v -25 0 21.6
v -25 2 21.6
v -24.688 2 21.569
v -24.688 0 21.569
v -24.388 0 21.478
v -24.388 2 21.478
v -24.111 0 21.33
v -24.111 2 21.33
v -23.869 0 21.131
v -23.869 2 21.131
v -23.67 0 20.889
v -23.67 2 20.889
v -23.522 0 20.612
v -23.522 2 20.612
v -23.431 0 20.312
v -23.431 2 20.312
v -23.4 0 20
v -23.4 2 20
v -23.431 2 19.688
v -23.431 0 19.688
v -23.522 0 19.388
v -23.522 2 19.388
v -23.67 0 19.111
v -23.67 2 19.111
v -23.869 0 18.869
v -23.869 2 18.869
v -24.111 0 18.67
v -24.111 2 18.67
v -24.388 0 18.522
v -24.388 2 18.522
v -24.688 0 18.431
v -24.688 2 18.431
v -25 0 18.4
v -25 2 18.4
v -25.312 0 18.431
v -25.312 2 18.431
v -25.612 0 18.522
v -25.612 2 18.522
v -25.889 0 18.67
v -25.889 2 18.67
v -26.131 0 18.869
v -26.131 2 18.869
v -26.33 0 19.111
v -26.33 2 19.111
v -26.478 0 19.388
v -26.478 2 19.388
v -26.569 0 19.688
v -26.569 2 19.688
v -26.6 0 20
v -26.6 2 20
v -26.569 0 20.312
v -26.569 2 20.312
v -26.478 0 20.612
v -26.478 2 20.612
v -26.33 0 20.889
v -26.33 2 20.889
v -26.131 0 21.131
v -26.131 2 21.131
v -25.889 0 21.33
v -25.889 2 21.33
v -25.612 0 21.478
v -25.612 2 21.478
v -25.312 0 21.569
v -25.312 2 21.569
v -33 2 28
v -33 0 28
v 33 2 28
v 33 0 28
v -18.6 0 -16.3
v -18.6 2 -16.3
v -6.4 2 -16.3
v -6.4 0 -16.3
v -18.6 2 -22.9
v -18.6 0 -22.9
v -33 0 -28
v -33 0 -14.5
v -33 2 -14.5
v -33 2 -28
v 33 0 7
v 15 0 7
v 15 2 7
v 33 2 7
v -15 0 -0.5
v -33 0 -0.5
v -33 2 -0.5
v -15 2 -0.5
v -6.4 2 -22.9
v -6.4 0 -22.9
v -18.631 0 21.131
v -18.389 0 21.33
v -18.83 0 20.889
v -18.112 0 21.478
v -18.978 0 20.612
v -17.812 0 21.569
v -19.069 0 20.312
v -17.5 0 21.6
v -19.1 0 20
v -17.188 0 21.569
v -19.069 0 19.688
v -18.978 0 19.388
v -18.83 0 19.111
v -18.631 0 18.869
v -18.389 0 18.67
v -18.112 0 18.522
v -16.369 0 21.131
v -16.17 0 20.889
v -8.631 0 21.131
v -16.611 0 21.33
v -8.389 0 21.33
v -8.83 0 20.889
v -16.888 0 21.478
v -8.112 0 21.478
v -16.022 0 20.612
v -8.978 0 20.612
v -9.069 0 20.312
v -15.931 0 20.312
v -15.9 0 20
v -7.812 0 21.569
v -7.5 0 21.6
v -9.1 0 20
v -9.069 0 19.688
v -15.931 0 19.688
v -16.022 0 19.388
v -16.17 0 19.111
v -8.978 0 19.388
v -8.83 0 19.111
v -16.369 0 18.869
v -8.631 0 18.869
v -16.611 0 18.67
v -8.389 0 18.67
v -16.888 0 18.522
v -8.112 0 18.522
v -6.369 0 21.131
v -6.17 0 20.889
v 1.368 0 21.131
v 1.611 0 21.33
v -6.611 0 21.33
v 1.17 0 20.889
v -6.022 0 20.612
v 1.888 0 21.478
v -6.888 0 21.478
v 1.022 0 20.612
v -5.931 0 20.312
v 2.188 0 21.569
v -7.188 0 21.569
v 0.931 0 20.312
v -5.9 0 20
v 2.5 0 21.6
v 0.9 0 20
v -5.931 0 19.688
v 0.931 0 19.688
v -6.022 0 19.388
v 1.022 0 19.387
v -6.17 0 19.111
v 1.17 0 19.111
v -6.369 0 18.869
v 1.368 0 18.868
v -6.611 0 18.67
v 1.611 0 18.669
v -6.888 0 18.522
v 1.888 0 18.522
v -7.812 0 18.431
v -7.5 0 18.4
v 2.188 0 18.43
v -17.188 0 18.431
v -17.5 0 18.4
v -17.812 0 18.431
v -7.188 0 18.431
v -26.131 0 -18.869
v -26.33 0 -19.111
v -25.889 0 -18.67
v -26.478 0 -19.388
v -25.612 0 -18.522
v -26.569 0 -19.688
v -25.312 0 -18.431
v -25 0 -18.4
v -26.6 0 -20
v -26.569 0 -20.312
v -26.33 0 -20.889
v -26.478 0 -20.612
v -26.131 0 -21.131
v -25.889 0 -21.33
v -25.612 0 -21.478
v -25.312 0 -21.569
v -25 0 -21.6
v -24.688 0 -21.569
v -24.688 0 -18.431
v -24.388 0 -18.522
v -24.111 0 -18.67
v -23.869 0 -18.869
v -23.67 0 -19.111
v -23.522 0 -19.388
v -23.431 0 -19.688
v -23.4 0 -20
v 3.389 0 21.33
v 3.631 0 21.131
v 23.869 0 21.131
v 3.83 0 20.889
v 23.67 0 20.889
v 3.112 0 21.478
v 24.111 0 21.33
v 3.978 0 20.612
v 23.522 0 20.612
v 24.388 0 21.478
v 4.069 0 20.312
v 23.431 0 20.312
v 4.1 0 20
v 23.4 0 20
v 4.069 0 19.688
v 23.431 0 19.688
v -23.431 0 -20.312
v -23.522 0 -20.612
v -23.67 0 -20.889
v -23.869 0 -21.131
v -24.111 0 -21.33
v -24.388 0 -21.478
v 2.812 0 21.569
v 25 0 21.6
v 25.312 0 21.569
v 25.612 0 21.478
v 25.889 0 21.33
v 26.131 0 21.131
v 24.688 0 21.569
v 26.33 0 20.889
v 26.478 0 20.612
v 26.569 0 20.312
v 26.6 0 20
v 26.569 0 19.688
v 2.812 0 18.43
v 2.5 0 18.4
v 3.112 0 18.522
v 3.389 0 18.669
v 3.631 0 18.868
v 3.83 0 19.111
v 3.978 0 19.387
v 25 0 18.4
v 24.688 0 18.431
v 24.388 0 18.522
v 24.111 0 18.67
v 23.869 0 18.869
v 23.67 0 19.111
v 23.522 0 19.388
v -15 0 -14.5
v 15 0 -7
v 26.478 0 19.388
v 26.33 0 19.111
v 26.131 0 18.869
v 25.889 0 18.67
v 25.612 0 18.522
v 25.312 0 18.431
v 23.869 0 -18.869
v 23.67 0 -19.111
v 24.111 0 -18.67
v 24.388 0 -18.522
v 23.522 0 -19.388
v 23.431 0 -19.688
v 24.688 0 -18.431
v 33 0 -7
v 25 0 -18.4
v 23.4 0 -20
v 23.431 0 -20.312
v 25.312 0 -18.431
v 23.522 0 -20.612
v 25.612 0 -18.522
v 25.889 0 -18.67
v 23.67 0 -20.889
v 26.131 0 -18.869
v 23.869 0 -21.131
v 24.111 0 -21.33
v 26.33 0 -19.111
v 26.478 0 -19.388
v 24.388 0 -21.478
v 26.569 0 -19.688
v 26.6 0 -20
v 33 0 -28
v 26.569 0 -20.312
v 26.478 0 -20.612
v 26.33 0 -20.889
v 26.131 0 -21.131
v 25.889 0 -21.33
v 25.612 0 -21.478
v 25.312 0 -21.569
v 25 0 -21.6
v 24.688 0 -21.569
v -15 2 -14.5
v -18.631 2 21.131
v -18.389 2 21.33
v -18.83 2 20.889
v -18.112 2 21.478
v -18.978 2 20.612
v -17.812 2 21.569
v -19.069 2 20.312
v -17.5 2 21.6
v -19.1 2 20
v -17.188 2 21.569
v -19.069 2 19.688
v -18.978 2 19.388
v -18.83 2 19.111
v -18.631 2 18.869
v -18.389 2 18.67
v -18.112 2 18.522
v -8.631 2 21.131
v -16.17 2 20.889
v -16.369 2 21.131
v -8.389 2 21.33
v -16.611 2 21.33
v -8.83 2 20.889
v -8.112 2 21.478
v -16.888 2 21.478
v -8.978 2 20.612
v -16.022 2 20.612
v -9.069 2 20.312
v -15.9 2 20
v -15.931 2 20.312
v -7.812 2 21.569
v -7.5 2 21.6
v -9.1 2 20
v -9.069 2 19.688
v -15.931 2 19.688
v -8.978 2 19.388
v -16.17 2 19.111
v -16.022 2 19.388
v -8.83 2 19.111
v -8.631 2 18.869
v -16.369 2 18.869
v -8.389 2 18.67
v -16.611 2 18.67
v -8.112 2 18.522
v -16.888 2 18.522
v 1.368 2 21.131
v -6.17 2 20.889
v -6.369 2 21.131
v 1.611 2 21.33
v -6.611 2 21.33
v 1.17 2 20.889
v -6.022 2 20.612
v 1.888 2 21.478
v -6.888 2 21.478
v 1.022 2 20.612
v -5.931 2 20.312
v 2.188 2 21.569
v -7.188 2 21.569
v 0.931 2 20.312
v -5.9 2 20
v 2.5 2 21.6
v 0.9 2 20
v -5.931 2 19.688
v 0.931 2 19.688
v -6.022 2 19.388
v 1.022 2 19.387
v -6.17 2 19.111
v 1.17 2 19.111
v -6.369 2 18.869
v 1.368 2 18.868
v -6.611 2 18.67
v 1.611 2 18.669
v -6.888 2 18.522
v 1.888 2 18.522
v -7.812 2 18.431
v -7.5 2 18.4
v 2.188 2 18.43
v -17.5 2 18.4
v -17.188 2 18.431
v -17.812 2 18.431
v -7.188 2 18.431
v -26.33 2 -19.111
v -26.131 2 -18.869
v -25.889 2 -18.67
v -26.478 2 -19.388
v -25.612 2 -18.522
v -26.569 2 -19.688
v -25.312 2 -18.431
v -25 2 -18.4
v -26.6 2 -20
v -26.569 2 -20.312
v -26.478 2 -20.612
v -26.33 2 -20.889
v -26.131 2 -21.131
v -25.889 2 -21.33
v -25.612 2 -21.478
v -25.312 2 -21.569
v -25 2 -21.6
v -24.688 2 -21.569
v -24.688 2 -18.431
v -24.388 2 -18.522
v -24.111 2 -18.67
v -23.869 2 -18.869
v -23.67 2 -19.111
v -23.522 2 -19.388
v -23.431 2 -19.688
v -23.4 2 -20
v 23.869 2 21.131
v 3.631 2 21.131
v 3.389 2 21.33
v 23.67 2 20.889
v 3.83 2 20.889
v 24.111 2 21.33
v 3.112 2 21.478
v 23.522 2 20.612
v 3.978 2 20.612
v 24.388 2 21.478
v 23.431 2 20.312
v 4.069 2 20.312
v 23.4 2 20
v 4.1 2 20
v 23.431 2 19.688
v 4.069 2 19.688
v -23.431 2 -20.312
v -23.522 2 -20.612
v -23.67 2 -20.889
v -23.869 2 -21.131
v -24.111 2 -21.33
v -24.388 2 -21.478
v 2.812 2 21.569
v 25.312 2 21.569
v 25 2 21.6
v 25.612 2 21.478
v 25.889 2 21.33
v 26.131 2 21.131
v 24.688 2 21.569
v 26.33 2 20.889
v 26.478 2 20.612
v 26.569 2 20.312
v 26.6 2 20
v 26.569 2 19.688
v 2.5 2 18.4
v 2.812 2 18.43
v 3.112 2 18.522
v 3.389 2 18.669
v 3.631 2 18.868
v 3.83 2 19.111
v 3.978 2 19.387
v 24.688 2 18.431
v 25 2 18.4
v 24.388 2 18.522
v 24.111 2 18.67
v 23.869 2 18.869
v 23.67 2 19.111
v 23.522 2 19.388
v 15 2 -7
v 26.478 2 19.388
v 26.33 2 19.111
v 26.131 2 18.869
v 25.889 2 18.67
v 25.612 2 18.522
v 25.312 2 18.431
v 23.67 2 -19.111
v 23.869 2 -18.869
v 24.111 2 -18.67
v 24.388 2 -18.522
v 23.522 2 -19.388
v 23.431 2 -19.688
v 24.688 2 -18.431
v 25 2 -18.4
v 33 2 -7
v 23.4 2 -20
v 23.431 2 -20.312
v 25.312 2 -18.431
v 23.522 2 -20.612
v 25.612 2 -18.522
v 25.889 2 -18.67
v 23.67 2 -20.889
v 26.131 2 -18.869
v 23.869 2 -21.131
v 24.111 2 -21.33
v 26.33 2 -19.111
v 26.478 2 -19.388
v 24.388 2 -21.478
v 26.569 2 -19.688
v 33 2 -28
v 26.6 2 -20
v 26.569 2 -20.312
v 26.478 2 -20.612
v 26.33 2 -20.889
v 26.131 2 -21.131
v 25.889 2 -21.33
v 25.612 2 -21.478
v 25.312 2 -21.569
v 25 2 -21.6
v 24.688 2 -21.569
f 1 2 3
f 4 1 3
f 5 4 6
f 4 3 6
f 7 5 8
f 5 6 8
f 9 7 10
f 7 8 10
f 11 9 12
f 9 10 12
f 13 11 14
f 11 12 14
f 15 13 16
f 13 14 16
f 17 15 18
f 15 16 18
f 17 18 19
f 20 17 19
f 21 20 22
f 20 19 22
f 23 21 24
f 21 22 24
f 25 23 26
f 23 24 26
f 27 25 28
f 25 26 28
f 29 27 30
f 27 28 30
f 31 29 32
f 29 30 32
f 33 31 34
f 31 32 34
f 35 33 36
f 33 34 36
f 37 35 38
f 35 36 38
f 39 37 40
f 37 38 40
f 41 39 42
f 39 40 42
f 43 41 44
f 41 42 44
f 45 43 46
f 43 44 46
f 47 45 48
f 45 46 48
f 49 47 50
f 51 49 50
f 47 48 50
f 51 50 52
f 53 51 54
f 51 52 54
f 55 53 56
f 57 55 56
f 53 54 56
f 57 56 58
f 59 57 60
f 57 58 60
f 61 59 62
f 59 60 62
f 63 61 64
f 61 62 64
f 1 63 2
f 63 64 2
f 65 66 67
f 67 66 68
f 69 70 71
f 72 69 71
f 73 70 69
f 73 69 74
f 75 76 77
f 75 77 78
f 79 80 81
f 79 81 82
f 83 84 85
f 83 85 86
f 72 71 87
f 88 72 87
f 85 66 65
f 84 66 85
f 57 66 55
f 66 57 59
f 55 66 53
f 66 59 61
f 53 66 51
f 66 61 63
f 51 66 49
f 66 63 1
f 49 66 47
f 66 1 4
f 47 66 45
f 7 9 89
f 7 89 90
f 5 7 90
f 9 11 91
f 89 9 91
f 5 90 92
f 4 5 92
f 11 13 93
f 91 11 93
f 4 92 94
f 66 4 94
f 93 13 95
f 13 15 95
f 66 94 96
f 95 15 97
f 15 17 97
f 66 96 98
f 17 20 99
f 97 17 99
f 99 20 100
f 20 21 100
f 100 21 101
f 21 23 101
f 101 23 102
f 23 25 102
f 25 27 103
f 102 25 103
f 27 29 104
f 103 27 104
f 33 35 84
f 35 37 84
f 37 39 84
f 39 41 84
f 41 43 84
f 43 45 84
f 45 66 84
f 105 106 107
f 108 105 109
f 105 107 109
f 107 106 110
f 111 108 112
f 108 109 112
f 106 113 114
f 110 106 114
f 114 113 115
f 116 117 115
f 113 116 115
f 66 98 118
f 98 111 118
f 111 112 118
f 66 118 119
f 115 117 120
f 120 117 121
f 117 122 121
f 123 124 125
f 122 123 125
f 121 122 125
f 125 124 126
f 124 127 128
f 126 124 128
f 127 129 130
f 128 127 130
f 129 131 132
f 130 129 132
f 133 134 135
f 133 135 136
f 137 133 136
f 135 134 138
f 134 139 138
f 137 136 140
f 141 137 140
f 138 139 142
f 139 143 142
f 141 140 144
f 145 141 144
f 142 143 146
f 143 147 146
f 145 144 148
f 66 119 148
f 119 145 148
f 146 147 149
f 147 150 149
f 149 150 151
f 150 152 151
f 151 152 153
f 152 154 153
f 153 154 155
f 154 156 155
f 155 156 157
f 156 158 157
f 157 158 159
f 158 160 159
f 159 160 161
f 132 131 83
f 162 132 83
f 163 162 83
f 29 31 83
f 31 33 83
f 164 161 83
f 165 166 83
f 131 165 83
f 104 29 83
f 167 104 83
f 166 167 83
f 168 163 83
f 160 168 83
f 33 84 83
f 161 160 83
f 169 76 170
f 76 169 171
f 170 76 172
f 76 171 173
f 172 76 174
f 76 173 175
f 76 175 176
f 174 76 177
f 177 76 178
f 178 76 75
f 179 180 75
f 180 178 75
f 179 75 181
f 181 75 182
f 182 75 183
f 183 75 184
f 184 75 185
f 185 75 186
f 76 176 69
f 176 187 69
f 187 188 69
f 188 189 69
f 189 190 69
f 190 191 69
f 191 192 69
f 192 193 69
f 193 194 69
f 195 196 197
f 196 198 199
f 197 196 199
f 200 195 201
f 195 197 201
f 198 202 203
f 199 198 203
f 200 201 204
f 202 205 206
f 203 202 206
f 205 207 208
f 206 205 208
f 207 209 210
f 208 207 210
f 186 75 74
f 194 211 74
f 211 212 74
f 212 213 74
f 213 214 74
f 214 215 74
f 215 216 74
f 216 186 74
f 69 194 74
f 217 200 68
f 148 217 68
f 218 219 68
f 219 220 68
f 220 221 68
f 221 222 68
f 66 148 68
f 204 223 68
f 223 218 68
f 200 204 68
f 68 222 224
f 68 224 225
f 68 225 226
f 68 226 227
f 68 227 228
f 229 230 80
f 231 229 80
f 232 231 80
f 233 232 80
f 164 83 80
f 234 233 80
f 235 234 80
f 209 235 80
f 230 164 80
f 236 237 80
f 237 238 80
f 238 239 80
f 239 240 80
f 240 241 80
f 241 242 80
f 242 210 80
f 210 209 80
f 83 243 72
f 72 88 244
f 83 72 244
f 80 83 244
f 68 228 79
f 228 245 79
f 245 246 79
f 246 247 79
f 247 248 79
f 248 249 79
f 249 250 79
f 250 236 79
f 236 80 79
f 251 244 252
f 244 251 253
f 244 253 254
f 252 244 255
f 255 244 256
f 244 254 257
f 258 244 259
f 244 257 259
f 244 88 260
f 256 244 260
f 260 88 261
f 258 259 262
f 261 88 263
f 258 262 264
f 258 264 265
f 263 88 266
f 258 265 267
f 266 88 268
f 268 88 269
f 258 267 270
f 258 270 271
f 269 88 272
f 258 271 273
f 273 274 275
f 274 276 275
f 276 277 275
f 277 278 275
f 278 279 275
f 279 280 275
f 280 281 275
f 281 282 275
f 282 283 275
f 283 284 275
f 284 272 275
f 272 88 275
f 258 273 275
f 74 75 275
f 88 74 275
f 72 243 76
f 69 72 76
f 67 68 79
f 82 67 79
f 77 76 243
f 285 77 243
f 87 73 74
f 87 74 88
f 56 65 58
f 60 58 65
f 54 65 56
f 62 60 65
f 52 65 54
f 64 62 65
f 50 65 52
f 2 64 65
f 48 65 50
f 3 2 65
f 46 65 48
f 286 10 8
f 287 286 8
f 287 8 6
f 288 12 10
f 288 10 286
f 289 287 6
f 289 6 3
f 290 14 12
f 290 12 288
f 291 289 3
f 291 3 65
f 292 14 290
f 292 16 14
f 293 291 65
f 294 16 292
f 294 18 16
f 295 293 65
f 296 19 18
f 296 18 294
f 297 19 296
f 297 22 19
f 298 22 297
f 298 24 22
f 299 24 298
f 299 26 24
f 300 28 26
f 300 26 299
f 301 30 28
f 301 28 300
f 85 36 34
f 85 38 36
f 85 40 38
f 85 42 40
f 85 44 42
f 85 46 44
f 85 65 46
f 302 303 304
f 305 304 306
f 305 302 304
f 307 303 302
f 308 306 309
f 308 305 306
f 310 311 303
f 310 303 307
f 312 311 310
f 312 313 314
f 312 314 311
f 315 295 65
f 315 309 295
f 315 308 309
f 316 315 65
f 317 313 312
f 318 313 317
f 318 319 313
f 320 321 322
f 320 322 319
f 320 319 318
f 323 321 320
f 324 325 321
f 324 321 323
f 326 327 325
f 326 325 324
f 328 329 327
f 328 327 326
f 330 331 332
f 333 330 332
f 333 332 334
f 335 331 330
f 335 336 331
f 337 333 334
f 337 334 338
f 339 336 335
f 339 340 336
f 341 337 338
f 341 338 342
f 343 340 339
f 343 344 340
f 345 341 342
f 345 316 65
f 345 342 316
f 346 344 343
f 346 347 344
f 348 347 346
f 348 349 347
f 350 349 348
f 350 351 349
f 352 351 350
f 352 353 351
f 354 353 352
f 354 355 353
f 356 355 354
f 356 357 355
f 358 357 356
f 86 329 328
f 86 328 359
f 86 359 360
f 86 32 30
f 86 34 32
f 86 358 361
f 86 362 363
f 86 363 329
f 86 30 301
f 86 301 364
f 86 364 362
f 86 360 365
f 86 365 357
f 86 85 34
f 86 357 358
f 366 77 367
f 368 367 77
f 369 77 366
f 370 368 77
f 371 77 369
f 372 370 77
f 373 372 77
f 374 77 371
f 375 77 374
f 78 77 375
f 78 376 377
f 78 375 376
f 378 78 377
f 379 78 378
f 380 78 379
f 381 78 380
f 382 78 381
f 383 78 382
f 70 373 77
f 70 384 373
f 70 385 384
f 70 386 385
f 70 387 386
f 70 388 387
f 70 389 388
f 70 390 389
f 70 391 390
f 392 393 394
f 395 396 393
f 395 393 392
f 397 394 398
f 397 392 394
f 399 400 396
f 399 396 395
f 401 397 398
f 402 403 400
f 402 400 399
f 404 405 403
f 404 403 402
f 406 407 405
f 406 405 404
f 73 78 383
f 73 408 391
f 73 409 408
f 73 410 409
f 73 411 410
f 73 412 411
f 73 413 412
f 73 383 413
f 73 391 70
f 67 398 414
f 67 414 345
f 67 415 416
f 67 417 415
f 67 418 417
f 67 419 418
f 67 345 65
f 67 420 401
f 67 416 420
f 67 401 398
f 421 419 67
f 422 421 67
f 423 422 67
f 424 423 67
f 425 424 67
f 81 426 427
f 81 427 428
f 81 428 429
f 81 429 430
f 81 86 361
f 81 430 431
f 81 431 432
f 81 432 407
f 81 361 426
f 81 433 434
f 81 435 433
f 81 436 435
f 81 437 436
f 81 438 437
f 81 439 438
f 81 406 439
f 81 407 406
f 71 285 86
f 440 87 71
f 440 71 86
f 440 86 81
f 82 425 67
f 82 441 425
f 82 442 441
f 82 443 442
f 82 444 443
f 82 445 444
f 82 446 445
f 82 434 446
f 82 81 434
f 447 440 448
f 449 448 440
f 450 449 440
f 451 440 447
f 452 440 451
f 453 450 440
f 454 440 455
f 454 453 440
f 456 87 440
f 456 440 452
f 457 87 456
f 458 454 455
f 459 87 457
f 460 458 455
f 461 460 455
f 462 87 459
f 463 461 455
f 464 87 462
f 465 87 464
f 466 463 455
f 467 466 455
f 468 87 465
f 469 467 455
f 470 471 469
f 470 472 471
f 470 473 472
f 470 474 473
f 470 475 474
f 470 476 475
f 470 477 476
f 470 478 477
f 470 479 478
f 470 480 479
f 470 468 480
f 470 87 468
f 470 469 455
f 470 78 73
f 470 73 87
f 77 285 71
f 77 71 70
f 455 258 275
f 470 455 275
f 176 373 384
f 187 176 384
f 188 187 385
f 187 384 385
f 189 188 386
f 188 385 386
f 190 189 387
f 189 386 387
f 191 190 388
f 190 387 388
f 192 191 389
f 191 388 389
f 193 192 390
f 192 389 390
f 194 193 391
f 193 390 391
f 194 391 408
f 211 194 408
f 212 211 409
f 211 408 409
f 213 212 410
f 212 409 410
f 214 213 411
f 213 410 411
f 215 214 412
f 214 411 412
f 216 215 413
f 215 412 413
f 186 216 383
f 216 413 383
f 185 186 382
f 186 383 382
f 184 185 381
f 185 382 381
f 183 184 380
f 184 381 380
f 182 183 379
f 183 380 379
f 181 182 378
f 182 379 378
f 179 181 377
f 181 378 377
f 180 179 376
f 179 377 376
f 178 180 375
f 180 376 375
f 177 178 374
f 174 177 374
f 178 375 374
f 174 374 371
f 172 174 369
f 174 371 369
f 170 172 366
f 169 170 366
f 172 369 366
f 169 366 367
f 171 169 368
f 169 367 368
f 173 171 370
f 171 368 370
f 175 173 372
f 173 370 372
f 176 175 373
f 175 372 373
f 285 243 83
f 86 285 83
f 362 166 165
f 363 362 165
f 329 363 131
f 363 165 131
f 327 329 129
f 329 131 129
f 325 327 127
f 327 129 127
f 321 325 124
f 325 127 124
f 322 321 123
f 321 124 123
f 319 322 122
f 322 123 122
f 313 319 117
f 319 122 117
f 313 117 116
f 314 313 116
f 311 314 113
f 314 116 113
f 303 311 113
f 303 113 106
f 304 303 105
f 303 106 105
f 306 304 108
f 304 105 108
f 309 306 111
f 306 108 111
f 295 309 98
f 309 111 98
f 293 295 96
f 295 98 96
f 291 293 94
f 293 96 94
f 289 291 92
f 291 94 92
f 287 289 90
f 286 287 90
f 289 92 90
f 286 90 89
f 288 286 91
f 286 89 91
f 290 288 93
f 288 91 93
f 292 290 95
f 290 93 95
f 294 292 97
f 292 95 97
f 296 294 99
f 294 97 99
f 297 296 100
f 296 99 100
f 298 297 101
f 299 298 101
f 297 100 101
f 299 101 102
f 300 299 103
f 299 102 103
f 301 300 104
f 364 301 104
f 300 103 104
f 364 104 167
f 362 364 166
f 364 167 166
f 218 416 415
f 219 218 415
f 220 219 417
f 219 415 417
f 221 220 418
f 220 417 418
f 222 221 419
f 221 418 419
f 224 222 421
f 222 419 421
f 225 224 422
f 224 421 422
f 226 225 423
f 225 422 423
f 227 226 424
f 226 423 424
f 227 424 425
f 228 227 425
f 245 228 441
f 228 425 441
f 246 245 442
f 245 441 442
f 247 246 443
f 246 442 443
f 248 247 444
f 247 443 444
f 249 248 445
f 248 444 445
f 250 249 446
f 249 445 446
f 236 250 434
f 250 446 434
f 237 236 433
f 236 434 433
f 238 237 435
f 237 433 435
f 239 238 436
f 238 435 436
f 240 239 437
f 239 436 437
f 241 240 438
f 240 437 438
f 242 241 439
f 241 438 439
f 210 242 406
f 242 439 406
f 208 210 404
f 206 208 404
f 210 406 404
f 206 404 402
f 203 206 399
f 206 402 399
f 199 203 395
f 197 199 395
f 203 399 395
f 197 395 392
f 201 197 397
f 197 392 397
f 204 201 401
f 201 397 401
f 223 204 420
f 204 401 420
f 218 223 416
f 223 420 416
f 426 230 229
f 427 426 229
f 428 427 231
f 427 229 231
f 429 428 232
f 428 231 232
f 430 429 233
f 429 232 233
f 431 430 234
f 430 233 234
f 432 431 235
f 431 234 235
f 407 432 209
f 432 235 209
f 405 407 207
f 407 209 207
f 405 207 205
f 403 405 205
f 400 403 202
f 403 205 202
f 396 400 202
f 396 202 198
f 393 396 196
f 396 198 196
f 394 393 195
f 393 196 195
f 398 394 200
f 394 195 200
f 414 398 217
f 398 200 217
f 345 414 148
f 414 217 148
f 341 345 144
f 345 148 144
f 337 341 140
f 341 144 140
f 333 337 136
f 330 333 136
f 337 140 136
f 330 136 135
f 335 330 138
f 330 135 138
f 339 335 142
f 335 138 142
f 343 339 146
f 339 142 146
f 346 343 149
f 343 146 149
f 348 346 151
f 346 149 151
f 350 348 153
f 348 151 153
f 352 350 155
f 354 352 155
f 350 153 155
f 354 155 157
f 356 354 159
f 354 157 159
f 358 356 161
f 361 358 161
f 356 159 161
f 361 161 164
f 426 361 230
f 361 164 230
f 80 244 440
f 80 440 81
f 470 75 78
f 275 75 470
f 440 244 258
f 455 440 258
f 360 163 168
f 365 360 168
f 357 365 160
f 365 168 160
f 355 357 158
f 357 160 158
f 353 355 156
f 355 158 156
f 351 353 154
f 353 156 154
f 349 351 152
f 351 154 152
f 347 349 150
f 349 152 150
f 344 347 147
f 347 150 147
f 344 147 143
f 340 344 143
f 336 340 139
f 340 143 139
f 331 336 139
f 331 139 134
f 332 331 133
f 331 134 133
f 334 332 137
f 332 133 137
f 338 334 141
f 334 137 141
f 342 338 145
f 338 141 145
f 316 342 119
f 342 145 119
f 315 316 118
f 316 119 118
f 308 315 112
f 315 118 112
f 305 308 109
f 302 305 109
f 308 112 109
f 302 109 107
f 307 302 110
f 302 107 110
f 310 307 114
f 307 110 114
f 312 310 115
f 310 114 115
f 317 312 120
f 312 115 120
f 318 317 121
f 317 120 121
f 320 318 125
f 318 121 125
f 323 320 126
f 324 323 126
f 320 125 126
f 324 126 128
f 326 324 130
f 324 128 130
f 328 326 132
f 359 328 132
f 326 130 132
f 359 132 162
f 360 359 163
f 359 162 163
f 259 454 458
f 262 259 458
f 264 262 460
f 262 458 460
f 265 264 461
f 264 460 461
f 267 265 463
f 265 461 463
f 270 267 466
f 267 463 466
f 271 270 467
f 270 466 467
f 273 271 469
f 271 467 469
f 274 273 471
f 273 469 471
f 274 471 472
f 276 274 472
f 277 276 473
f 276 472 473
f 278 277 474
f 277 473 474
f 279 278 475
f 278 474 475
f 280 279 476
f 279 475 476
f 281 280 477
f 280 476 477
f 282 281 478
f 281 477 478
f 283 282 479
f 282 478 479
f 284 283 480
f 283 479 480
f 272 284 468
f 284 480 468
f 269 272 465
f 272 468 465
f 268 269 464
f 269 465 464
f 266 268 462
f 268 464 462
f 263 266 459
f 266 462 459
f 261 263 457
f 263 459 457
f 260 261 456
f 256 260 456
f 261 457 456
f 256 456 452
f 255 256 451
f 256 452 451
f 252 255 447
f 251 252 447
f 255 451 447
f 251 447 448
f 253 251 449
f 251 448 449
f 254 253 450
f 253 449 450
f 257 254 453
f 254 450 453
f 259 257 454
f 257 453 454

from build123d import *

# Parameters (mm, degrees)
SKETCH_1_W                  = 66
SKETCH_1_H                  = 56
EXTRUDE_1_DEPTH             = 2
SKETCH_2_R                  = 1.6
CUT_EXTRUDE_1_DEPTH         = 2
PATTERN_LINEAR_1_COUNT      = 2
PATTERN_LINEAR_1_PITCH      = 50
PATTERN_LINEAR_1_COUNT_DIR2 = 2
PATTERN_LINEAR_1_PITCH_DIR2 = 40
SKETCH_4_R                  = 1.6
CUT_EXTRUDE_2_DEPTH         = 2
SKETCH_5_W                  = 18
SKETCH_5_H                  = 14
CUT_EXTRUDE_3_DEPTH         = 2
SKETCH_7_W                  = 18
SKETCH_7_H                  = 14
CUT_EXTRUDE_4_DEPTH         = 2
SKETCH_8_W                  = 12.2
SKETCH_8_H                  = 6.6
CUT_EXTRUDE_5_DEPTH         = 2


with BuildPart() as part:
    # 草图1 → 凸台-拉伸1 (new body)
    with BuildSketch(Plane(origin=(0, 0, 0), x_dir=(1, 0, 0), z_dir=(0, 1, 0))):
        Rectangle(SKETCH_1_W, SKETCH_1_H)
    extrude(amount=EXTRUDE_1_DEPTH)

    # 草图2 → 切除-拉伸1 (cut)
    with BuildSketch(Plane(origin=(0, 2, 0), x_dir=(1, 0, 0), z_dir=(0, 1, 0))):
        with Locations(Location((-25, 20, 0), (0, 0, 270))):
            Circle(SKETCH_2_R)
    cut_extrude_1 = extrude(amount=-CUT_EXTRUDE_1_DEPTH, mode=Mode.SUBTRACT)

    # 阵列(线性)1: Cut-Extrude 1 2 × 2
    with Locations(*[(i * PATTERN_LINEAR_1_PITCH, 0, j * PATTERN_LINEAR_1_PITCH_DIR2) for i in range(PATTERN_LINEAR_1_COUNT) for j in range(PATTERN_LINEAR_1_COUNT_DIR2) if (i, j) != (0, 0)]):
        add(cut_extrude_1, mode=Mode.SUBTRACT)

    # 草图4 → 切除-拉伸2 (cut)
    with BuildSketch(Plane.XZ):
        with Locations(Location((-17.49998476, 20.00007874, 0), (0, 0, 270))):
            Circle(SKETCH_4_R)
        with Locations(Location((-7.49996444, 20.00007874, 0), (0, 0, 270))):
            Circle(SKETCH_4_R)
        with Locations(Location((2.49985522, 19.999735839, 0), (0, 0, 270))):
            Circle(SKETCH_4_R)
    extrude(amount=-CUT_EXTRUDE_2_DEPTH, mode=Mode.SUBTRACT)

    # 草图5 → 切除-拉伸3 (cut)
    with BuildSketch(Plane.XZ):
        with Locations((24, 0)):
            Rectangle(SKETCH_5_W, SKETCH_5_H)
    extrude(amount=-CUT_EXTRUDE_3_DEPTH, mode=Mode.SUBTRACT)

    # 草图7 → 切除-拉伸4 (cut)
    with BuildSketch(Plane.XZ):
        with Locations((-24, -7.5)):
            Rectangle(SKETCH_7_W, SKETCH_7_H)
    extrude(amount=-CUT_EXTRUDE_4_DEPTH, mode=Mode.SUBTRACT)

    # 草图8 → 切除-拉伸5 (cut)
    with BuildSketch(Plane(origin=(0, 2, 0), x_dir=(1, 0, 0), z_dir=(0, 1, 0))):
        with Locations((-12.4999746, 19.599995025)):
            Rectangle(SKETCH_8_W, SKETCH_8_H)
    extrude(amount=-CUT_EXTRUDE_5_DEPTH, mode=Mode.SUBTRACT)


solid = part.part
